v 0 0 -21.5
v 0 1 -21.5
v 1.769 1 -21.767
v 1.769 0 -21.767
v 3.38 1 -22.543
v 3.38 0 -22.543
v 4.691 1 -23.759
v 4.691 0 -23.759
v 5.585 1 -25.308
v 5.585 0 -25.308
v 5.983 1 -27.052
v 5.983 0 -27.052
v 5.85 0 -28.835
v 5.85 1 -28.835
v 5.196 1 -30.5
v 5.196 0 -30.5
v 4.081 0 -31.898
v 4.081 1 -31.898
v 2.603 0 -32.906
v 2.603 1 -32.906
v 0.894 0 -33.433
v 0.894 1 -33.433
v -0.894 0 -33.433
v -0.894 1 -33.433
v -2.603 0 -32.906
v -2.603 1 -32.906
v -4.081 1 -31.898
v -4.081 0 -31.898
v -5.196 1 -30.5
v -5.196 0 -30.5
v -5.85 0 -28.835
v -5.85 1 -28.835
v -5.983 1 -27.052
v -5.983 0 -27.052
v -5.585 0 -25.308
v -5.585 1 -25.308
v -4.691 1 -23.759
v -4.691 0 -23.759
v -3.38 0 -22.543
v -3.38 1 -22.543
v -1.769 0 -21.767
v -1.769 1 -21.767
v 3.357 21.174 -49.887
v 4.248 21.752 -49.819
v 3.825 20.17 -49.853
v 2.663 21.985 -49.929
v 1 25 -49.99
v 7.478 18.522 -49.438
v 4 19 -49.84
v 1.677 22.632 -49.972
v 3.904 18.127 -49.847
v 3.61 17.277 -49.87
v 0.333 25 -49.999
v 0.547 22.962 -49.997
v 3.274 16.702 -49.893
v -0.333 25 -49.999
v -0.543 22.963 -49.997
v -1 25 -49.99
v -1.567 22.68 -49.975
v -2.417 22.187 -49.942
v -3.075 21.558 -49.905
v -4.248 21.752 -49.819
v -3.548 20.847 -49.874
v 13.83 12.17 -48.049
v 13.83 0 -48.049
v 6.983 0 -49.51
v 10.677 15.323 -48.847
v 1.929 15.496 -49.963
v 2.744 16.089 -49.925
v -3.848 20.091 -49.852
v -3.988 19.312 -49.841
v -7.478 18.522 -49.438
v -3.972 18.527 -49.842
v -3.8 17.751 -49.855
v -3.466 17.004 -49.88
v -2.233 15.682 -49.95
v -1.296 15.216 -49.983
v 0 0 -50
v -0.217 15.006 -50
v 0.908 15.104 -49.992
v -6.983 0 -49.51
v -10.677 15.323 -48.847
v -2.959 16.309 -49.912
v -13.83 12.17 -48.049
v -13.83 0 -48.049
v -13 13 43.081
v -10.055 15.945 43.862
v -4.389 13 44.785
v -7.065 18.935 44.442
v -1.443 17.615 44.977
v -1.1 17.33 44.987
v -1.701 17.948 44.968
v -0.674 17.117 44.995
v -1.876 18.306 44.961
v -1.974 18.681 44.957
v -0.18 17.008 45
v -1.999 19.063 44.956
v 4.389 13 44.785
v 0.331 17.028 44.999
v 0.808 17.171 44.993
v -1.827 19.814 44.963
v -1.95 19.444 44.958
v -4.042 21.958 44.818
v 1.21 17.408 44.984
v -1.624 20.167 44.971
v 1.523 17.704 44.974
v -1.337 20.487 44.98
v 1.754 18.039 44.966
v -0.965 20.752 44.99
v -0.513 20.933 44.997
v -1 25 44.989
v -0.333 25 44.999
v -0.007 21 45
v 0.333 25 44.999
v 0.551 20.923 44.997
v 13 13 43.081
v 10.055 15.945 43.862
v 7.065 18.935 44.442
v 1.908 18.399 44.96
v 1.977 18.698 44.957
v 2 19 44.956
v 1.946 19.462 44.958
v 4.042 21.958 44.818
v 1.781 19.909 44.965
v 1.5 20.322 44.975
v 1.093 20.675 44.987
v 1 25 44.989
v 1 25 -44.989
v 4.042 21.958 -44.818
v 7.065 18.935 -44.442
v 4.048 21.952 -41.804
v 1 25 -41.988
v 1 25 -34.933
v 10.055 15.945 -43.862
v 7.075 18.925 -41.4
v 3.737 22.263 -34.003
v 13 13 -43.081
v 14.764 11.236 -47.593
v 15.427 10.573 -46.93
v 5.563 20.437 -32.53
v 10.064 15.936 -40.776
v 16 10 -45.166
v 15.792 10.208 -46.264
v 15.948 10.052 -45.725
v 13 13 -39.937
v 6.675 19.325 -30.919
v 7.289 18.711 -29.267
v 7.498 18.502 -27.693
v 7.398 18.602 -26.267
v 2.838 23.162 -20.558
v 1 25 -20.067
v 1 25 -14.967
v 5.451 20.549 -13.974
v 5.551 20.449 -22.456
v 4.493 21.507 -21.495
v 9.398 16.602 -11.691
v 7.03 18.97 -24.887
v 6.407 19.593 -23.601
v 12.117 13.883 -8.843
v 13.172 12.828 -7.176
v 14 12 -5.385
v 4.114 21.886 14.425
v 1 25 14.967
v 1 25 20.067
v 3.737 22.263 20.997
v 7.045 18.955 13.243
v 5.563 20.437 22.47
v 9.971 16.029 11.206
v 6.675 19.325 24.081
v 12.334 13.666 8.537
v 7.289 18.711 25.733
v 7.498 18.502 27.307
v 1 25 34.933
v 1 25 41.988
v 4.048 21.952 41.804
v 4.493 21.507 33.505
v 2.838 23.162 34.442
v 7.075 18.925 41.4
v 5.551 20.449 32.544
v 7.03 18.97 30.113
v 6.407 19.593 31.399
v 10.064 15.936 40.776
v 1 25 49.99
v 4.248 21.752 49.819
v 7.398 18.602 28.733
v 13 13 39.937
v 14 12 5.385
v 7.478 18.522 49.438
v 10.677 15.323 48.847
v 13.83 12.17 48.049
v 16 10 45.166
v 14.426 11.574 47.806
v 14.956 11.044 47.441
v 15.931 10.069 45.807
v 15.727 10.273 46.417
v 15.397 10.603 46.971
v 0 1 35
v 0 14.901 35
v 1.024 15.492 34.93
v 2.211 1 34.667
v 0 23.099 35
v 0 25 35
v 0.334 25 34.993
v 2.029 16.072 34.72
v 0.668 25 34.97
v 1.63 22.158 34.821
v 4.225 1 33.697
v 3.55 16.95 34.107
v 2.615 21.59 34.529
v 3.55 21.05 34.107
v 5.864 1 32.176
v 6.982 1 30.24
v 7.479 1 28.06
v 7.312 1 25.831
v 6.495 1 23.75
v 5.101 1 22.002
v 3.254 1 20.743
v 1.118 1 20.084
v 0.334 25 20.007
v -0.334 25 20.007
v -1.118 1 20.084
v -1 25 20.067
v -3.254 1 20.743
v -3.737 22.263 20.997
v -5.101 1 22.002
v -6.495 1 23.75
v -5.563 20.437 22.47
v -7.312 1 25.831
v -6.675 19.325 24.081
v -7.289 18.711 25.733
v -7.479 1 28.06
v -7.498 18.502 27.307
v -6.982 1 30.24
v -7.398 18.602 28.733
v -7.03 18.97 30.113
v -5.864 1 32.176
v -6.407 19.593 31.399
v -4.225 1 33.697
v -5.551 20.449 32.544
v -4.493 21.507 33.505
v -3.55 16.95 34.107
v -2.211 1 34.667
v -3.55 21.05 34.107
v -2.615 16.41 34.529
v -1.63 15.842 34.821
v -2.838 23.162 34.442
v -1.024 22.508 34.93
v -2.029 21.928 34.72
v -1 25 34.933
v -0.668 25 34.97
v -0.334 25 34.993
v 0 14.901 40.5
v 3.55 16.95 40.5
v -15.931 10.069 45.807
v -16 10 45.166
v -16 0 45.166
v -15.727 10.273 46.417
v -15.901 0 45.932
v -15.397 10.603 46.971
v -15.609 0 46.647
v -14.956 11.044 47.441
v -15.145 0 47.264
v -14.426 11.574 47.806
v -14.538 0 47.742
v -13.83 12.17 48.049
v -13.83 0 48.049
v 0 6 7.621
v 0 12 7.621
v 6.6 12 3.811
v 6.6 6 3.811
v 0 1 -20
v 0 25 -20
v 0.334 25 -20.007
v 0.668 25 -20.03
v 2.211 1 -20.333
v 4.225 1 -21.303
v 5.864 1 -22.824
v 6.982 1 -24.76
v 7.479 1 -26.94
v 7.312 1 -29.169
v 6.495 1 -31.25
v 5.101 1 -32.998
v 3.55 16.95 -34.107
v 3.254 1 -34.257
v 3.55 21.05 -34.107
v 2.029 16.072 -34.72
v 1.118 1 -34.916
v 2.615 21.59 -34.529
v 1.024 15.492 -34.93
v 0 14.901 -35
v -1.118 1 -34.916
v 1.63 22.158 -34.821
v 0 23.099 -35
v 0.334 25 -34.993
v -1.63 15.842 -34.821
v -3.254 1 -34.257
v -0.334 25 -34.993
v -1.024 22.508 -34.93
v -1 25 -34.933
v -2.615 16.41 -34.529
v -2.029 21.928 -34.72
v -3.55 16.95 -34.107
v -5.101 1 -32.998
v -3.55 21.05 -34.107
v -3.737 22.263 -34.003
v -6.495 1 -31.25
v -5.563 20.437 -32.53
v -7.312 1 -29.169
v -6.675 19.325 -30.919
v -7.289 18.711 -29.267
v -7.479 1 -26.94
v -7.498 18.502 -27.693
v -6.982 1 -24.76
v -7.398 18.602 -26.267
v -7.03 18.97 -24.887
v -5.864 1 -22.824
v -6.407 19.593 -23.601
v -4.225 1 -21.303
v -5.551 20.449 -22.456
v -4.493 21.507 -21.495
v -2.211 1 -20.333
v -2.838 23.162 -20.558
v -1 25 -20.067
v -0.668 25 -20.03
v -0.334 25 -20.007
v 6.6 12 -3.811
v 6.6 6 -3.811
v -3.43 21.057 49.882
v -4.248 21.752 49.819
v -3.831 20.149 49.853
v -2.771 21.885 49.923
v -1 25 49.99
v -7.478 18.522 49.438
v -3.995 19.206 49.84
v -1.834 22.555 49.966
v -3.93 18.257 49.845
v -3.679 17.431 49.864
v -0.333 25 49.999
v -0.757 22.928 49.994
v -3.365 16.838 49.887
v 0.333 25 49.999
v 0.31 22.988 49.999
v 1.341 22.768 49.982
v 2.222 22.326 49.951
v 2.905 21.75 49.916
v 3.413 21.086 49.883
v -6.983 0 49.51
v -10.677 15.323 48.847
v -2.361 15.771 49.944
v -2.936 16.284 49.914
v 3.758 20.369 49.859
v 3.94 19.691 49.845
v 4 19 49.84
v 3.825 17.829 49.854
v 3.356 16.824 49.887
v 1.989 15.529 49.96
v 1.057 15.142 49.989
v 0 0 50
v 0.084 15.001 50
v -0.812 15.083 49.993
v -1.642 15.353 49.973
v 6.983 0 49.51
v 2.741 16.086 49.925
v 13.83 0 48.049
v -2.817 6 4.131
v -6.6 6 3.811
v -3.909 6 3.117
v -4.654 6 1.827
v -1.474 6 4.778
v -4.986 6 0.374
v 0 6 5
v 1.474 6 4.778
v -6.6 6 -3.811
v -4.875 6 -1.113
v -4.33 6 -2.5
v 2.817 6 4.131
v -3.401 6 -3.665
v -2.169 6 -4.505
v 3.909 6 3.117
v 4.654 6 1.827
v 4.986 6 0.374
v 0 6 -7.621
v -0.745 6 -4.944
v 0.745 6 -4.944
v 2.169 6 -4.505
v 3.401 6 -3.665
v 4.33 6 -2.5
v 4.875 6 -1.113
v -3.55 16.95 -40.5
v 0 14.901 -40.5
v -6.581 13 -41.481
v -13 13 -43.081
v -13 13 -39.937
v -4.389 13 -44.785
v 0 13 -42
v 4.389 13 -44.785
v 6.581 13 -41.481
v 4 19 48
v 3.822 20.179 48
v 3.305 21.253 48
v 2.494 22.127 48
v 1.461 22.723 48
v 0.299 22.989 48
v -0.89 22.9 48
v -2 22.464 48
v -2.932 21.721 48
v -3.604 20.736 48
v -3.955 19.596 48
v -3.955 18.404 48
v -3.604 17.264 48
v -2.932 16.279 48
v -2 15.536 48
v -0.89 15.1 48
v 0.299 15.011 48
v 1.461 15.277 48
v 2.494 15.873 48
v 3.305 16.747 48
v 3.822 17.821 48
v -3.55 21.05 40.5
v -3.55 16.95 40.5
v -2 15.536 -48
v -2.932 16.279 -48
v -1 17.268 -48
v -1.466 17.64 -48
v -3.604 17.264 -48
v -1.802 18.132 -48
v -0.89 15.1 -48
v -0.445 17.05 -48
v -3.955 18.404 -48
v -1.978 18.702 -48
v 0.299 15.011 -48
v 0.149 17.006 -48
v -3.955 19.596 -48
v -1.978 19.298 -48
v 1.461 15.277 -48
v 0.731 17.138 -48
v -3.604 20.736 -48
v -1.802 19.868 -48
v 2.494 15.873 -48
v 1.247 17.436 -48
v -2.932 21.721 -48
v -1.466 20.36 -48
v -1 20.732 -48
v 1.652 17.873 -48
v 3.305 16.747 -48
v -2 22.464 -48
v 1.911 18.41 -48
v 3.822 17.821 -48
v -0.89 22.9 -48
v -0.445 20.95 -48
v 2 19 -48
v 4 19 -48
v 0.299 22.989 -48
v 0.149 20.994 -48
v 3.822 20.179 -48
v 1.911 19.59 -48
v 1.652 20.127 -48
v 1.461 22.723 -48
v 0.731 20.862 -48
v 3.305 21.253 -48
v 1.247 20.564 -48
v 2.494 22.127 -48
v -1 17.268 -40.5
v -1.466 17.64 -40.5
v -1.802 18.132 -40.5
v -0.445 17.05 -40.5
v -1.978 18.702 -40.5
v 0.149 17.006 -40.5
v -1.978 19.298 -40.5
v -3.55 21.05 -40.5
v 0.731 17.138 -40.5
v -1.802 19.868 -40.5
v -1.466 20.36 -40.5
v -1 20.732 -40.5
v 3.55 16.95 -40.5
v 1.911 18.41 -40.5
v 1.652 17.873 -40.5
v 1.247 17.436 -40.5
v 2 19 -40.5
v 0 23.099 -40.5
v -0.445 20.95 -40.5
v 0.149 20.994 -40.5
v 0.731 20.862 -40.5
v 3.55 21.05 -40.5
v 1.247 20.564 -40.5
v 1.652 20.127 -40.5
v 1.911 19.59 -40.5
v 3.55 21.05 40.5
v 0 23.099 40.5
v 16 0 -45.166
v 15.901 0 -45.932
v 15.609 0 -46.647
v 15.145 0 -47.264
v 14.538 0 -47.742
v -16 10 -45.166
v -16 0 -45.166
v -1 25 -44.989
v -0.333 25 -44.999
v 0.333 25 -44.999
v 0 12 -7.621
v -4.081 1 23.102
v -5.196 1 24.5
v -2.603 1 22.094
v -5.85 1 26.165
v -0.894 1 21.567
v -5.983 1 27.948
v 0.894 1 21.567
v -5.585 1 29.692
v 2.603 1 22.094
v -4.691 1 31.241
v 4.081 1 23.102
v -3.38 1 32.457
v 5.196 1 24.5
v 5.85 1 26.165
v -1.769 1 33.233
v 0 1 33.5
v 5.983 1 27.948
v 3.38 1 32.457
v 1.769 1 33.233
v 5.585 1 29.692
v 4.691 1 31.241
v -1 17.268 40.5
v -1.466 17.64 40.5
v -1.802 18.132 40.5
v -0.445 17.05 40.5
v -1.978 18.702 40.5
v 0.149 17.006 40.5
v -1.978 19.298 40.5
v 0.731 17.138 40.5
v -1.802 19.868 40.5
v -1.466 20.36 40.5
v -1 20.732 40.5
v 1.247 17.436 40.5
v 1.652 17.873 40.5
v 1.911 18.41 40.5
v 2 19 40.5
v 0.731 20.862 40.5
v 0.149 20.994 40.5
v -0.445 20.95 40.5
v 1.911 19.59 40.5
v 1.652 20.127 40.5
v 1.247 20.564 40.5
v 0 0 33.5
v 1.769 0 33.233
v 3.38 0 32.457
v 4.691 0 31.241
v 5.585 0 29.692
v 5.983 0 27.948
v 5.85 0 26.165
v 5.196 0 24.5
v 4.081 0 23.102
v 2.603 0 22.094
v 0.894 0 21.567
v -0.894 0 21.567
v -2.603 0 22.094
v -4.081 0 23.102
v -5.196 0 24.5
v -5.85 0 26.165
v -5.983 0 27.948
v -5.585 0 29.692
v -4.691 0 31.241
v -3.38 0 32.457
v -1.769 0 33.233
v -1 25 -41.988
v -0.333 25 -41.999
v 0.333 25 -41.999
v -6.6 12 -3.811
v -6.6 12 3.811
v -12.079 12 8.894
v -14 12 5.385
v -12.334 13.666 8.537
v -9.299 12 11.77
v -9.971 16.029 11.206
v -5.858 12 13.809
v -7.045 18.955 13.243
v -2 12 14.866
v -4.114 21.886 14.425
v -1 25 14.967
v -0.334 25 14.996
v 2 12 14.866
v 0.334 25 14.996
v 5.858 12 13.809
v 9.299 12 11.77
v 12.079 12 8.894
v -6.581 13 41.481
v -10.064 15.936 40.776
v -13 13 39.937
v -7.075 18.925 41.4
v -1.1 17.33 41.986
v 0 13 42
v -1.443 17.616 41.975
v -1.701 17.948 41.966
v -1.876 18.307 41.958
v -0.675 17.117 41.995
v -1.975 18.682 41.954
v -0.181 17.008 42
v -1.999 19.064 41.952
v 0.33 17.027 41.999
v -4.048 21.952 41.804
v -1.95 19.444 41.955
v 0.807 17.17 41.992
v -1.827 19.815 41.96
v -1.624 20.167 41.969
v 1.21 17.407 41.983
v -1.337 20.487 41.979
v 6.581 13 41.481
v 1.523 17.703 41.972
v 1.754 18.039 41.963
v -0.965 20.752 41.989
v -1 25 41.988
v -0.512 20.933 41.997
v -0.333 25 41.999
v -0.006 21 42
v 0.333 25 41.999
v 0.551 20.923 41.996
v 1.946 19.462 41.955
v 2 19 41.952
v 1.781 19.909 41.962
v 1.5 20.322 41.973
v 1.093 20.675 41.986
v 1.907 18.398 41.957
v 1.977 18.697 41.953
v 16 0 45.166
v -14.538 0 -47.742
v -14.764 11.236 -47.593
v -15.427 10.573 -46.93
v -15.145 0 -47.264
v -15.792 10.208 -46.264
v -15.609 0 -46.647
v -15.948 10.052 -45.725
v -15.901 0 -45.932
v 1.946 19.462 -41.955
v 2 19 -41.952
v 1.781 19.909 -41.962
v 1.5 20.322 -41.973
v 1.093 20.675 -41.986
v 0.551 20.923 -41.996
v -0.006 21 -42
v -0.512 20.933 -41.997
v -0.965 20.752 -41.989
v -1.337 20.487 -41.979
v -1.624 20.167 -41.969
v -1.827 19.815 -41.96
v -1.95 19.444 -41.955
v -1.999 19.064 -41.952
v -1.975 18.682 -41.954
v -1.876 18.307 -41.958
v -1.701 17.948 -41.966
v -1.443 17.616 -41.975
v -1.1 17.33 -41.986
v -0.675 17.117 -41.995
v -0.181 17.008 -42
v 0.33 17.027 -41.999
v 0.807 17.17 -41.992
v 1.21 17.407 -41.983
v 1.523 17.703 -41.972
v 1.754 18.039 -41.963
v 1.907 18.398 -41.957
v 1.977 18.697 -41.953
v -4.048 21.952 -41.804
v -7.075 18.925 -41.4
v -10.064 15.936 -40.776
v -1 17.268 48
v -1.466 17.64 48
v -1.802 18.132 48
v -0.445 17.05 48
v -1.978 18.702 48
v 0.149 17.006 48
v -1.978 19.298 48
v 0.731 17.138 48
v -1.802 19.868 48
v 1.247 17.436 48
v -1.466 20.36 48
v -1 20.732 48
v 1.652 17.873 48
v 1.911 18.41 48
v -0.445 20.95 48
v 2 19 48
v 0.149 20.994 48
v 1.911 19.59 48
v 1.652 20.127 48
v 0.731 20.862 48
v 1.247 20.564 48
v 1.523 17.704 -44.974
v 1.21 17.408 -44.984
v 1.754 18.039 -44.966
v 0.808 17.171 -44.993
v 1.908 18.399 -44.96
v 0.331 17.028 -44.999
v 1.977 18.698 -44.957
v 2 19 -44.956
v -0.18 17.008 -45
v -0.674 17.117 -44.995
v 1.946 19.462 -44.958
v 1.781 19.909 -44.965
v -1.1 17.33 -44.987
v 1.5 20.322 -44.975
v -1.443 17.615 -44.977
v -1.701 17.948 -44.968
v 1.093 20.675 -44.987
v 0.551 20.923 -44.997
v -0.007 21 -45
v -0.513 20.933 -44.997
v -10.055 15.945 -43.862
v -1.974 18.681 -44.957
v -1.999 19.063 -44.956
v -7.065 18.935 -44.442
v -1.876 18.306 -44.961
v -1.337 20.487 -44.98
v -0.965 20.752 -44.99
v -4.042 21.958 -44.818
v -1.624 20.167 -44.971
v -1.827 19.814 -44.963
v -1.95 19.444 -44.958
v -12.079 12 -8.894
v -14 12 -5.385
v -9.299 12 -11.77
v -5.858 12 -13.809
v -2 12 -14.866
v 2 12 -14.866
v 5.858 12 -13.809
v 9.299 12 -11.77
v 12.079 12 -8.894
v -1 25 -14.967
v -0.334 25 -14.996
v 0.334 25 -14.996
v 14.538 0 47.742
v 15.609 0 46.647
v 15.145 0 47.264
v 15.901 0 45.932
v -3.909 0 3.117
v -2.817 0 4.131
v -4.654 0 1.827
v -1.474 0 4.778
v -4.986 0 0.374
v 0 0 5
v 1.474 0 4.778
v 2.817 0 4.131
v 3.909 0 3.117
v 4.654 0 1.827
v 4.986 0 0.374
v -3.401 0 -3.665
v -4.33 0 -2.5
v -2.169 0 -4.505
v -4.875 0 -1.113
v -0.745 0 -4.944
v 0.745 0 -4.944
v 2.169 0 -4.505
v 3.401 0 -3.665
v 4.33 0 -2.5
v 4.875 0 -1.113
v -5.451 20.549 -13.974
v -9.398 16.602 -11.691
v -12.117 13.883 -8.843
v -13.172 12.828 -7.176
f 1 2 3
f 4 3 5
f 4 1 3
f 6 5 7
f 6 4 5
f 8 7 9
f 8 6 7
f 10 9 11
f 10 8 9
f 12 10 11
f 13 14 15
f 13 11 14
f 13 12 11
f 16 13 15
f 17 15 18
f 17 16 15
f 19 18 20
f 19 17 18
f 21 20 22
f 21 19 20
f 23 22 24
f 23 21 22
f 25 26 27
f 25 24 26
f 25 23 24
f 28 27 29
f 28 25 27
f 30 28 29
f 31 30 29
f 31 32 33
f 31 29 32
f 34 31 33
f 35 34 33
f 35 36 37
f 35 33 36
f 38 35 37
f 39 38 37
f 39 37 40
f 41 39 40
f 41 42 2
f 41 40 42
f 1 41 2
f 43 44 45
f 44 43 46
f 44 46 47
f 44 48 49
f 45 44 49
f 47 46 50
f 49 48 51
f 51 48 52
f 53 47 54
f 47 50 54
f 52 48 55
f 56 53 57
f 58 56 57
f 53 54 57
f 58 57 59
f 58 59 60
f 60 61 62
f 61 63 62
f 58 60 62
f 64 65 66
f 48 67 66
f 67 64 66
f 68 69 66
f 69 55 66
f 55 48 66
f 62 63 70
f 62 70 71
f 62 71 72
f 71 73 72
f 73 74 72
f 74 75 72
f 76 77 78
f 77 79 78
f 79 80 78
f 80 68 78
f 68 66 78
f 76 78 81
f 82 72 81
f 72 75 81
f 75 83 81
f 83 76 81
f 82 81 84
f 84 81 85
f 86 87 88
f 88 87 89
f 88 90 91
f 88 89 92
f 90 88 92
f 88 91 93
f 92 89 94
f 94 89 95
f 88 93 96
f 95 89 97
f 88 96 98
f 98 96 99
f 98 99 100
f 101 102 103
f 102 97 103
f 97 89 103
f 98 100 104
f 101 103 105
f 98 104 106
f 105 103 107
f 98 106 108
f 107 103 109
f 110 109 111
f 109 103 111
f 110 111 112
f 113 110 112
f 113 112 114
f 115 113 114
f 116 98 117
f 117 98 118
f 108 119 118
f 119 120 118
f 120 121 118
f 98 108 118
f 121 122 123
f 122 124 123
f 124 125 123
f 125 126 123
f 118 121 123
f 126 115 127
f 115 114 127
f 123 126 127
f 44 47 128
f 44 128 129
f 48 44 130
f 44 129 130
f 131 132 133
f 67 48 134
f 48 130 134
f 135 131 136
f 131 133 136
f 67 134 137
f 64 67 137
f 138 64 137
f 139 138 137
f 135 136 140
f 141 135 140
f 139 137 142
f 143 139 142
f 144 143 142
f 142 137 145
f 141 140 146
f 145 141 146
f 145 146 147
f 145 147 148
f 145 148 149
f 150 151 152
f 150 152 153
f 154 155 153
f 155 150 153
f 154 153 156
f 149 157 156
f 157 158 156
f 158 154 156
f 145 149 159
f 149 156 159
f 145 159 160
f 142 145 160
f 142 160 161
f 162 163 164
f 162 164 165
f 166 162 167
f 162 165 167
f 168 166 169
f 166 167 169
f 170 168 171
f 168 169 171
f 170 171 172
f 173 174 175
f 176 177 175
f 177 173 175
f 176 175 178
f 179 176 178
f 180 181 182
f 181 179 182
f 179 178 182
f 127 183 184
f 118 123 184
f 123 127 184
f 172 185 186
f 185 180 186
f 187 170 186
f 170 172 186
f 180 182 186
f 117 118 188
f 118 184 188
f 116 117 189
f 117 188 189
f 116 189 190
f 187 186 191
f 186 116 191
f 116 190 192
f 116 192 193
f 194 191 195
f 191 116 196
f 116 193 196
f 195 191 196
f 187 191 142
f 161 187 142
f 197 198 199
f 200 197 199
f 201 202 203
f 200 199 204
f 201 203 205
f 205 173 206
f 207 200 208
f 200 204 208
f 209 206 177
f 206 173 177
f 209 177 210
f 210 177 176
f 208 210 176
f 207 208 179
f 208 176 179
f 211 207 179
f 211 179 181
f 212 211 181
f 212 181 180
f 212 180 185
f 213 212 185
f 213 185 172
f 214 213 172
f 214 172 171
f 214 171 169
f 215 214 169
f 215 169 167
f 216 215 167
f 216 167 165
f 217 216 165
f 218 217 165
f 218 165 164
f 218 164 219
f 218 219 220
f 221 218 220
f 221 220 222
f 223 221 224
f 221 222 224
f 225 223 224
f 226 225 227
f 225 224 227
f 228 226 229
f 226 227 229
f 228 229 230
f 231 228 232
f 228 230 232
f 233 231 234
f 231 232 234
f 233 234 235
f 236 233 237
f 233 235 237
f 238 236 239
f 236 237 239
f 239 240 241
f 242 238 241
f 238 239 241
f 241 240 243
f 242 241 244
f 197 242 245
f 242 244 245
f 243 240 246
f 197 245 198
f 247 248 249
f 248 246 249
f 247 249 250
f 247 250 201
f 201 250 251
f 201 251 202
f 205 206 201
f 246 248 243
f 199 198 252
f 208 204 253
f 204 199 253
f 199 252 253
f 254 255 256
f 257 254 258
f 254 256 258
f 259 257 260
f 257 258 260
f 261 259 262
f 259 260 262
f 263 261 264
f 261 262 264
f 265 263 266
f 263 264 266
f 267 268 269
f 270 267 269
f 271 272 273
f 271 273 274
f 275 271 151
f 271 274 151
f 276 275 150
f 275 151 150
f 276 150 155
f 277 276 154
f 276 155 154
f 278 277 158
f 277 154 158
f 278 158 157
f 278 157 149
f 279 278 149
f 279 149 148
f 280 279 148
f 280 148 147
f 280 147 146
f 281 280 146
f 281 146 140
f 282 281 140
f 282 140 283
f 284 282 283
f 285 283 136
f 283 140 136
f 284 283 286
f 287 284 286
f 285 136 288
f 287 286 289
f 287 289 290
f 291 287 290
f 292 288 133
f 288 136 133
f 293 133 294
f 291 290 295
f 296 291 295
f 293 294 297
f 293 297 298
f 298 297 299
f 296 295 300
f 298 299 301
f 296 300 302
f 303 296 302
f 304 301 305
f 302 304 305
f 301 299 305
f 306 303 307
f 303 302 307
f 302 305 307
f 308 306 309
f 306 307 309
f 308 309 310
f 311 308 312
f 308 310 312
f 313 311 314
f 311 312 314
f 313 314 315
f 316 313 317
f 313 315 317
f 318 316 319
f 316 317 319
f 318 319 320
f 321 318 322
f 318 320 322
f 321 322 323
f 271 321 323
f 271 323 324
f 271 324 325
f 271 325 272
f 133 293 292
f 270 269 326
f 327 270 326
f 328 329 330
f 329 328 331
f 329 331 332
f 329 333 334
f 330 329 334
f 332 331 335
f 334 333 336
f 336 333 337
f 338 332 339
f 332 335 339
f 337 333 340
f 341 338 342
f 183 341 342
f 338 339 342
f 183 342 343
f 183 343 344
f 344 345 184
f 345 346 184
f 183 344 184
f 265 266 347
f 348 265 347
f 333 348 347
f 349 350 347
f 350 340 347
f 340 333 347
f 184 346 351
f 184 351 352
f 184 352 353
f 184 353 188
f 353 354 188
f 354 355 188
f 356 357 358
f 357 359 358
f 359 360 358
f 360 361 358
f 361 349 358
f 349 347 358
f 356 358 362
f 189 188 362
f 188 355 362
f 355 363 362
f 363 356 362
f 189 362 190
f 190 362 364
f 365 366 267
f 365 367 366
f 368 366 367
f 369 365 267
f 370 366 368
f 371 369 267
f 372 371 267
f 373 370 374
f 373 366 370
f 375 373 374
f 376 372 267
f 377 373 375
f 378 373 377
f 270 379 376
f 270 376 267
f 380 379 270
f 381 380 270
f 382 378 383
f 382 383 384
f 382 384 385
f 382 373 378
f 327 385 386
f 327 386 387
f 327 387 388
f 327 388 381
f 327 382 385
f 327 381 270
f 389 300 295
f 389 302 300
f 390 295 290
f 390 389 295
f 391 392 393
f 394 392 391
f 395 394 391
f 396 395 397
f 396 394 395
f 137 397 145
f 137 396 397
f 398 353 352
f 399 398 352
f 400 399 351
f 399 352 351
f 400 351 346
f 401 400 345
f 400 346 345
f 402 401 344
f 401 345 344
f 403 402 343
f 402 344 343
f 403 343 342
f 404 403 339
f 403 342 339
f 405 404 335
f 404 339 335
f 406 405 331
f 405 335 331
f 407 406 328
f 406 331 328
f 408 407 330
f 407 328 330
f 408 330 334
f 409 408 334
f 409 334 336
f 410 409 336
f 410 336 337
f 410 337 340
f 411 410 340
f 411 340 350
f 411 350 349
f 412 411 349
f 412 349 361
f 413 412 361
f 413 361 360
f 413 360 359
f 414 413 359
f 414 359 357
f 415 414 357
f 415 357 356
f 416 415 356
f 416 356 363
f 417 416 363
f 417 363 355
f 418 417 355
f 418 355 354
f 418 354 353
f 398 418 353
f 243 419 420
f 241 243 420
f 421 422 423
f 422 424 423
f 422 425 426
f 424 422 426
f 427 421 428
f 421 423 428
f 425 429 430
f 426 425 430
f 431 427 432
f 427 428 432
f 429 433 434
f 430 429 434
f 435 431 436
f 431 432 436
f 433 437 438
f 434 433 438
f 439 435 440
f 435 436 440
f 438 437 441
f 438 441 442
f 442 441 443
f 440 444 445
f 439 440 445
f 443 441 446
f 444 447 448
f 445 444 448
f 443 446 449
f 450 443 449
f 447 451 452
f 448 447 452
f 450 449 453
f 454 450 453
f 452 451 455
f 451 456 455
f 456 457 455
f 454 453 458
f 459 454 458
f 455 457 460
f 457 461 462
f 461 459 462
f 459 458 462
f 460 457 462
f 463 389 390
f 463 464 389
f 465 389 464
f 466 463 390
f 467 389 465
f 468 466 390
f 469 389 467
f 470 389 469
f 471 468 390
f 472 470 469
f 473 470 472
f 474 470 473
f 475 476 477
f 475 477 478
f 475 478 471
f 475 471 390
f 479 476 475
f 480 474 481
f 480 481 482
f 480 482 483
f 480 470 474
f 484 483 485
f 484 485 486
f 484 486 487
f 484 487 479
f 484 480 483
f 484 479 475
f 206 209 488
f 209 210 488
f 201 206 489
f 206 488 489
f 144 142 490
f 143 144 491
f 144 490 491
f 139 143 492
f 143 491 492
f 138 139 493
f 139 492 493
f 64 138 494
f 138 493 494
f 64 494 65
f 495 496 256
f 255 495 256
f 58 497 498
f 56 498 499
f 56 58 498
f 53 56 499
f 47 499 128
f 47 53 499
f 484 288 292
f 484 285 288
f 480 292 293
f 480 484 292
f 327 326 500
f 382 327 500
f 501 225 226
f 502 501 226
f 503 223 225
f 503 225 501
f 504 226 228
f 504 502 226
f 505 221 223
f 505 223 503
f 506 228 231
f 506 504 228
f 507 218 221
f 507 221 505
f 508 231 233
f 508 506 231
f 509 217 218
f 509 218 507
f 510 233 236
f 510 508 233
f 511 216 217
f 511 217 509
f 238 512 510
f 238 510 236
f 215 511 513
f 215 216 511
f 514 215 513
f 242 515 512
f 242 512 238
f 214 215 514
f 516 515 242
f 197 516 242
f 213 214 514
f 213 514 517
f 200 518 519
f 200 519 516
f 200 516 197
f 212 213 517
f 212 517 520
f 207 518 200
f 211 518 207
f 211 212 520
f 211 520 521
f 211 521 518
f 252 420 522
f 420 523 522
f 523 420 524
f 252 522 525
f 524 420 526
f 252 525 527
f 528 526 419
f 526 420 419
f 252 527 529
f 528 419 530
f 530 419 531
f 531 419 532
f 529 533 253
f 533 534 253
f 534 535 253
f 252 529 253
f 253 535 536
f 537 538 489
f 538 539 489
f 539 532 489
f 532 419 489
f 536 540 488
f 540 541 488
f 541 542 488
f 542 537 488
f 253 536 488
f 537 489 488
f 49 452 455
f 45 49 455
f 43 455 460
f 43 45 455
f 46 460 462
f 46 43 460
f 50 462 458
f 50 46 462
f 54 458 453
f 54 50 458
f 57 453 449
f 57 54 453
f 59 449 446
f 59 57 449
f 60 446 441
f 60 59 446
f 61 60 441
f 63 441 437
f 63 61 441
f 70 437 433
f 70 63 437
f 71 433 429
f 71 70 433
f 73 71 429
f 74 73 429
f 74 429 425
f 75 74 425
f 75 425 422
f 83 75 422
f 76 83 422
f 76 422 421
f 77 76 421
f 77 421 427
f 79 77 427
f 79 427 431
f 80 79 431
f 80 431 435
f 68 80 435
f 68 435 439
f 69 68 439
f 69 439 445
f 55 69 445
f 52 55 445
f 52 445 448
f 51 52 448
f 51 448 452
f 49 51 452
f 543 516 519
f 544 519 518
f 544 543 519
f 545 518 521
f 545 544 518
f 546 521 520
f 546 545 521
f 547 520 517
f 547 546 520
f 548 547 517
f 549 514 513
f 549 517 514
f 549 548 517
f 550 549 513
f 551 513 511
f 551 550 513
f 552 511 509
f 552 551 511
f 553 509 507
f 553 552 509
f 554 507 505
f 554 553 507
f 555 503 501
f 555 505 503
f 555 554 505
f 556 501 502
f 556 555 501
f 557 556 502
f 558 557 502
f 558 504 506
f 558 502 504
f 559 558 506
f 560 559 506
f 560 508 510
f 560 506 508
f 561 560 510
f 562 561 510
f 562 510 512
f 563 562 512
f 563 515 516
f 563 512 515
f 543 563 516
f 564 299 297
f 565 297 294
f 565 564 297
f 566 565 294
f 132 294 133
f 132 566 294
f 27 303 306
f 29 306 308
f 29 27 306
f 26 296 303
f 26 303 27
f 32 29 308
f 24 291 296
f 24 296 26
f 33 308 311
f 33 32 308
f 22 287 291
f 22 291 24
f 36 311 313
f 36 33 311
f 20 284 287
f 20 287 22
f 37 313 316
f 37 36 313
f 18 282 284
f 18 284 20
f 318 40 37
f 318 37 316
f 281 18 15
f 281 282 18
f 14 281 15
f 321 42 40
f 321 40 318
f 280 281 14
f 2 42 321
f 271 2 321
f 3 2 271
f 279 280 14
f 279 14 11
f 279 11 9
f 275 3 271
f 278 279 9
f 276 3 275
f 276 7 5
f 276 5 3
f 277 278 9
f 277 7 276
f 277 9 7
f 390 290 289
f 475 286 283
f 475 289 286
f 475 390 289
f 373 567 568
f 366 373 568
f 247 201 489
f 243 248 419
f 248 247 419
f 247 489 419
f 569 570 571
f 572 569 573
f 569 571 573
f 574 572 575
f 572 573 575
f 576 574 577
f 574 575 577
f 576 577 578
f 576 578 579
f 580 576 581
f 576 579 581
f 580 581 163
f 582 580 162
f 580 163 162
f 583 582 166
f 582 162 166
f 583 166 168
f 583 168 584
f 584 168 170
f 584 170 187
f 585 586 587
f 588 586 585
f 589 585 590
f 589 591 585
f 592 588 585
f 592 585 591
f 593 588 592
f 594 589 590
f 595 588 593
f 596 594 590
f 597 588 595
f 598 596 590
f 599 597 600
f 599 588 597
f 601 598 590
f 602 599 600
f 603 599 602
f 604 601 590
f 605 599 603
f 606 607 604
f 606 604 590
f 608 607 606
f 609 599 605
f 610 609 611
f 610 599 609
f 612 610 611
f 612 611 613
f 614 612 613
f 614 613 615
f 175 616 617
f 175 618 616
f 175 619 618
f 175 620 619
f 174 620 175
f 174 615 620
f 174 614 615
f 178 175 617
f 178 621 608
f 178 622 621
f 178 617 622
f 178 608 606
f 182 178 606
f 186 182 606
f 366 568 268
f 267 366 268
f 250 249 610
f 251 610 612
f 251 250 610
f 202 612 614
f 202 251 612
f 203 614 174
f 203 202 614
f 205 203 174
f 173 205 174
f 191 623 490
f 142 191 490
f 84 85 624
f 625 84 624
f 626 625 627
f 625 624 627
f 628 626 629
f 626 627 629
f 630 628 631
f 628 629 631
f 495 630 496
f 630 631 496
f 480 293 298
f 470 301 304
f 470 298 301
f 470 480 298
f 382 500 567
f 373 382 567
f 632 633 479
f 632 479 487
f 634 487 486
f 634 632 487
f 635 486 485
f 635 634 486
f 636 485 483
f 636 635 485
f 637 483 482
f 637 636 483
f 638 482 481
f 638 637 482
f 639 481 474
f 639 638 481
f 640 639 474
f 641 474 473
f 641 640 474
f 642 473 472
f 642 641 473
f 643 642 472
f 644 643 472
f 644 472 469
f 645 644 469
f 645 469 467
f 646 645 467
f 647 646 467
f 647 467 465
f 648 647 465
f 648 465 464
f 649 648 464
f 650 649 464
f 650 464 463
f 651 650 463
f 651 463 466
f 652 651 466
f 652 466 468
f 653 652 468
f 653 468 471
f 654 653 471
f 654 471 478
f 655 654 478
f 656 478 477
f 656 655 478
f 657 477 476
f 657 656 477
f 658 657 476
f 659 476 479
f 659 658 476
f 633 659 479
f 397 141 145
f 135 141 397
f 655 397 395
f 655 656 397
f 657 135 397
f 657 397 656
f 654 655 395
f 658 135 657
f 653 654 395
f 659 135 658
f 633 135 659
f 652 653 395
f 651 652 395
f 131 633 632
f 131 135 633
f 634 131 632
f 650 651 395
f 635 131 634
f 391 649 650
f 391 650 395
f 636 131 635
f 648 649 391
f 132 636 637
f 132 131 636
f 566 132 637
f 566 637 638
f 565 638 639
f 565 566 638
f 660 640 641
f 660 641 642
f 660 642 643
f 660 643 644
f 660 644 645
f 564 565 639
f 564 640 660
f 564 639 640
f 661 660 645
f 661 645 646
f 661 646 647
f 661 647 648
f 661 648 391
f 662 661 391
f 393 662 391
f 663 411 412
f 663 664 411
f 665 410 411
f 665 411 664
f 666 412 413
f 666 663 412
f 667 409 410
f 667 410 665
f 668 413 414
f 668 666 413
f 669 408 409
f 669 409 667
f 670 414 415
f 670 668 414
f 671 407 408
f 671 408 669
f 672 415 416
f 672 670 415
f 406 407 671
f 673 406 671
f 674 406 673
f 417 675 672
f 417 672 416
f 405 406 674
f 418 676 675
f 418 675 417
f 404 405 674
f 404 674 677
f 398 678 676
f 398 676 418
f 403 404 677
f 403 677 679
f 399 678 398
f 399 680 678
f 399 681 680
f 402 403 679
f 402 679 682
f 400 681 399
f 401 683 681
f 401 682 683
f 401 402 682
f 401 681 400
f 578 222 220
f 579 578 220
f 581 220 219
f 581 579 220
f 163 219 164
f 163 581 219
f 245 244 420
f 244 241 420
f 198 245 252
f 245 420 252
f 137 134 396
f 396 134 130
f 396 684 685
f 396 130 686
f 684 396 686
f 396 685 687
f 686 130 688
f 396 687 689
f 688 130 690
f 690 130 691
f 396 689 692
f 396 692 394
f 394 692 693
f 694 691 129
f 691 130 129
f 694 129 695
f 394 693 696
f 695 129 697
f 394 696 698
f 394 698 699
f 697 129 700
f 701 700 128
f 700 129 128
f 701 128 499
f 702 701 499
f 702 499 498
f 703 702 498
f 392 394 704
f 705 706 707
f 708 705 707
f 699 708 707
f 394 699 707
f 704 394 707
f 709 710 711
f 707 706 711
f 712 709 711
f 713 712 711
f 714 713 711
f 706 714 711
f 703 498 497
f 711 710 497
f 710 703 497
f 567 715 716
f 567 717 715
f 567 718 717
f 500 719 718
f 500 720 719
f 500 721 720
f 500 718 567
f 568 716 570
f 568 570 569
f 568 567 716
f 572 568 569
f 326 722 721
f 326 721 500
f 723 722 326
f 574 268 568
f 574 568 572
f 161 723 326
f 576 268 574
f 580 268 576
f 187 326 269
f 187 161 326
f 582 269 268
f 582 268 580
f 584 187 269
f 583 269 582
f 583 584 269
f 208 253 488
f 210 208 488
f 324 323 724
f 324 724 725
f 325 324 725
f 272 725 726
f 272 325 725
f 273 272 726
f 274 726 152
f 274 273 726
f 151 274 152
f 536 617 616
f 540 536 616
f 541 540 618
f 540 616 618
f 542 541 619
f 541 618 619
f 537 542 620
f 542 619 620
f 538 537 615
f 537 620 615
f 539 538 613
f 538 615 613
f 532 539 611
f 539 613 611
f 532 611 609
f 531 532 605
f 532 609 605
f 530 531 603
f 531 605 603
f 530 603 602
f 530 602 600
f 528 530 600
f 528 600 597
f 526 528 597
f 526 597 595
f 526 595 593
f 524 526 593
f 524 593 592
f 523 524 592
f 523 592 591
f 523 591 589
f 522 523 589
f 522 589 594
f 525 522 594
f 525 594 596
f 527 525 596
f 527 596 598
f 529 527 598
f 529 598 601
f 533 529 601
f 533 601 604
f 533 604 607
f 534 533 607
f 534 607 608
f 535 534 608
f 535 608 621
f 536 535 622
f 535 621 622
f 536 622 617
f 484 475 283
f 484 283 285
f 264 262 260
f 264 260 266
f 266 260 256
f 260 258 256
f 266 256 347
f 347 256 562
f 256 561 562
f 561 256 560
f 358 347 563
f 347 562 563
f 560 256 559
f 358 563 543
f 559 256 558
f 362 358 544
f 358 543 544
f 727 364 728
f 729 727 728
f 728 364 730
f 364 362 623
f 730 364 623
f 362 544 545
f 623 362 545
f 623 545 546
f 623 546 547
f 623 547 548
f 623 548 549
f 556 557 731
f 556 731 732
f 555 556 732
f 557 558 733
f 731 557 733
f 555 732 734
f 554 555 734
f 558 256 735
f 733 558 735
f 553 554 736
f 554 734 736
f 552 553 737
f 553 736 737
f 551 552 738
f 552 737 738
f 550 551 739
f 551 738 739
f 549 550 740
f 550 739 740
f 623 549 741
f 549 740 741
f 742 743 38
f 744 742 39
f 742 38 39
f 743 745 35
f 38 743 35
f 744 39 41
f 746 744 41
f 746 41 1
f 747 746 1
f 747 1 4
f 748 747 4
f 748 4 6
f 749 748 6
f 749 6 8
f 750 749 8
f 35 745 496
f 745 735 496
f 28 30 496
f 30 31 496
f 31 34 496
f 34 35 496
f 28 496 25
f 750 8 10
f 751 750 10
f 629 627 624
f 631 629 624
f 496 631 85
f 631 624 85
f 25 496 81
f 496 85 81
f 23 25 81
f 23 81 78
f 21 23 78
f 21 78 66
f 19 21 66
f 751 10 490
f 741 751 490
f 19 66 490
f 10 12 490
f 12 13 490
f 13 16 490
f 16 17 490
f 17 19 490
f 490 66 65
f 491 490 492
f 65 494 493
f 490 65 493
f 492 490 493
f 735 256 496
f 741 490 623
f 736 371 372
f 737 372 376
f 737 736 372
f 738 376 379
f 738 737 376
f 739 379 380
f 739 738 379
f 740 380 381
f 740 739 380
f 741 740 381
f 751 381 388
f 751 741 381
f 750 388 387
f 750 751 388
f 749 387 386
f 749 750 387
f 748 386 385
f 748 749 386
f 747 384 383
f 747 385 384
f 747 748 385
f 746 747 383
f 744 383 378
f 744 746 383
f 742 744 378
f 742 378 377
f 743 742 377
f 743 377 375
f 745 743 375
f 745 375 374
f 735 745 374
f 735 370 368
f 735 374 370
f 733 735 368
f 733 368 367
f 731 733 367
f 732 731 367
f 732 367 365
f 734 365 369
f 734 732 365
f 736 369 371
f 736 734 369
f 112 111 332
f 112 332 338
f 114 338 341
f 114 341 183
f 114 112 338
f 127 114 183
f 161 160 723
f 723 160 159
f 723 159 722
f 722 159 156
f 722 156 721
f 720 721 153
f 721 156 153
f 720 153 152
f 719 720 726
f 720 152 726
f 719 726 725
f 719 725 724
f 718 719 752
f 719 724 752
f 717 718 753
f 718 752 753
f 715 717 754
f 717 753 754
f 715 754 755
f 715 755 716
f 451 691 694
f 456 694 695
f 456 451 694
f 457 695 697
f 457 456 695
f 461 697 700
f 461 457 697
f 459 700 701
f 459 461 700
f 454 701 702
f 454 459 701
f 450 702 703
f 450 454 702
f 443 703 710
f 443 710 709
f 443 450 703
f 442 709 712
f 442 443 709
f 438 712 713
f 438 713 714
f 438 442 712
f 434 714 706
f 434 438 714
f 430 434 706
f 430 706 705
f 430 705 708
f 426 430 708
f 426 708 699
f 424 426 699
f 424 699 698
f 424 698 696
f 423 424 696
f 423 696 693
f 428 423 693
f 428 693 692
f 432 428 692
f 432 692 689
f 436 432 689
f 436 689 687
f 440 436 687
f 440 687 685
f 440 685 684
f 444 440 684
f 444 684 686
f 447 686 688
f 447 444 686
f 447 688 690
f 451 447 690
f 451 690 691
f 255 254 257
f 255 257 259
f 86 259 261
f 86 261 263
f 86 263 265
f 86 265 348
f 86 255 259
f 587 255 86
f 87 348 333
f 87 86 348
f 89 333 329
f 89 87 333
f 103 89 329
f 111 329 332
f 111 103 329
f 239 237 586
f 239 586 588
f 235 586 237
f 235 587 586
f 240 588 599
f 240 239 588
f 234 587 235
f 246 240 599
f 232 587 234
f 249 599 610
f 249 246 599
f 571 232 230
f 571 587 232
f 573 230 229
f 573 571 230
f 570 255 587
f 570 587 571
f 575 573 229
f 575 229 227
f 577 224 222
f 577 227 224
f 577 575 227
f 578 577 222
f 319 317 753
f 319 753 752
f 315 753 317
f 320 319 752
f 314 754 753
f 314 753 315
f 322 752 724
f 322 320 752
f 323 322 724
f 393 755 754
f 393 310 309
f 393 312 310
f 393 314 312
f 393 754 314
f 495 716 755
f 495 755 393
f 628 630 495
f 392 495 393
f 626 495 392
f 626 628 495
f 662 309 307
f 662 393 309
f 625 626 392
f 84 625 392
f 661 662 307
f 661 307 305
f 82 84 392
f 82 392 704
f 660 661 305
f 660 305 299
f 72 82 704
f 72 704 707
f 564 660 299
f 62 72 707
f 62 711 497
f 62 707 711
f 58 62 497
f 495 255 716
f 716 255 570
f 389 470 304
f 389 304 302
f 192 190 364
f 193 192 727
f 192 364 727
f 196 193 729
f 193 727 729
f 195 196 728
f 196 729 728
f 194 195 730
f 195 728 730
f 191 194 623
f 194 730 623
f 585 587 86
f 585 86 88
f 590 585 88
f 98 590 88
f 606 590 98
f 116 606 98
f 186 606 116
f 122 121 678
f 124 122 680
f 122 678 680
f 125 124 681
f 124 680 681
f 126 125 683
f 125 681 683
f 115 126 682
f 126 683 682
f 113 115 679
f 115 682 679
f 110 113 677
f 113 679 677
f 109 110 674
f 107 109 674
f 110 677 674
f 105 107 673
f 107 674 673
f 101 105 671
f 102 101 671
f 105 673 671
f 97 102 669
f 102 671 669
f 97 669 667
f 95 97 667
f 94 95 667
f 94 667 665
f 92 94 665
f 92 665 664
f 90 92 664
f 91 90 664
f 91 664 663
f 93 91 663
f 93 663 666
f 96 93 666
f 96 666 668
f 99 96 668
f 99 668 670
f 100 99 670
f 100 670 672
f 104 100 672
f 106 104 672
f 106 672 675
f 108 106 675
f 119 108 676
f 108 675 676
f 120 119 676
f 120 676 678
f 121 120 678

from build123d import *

# Parameters (mm, degrees)
SKETCH1_R               = 5
SKETCH1_R_2             = 6
BOSS_EXTRUDE1_DEPTH     = 25
SKETCH2_R               = 7.5
CUT_EXTRUDE1_DEPTH      = 24
SKETCH3_R               = 15
CUT_EXTRUDE2_DEPTH      = 13
CUT_EXTRUDE3_DEPTH      = 6
SKETCH5_R               = 45
SKETCH5_R_2             = 42
CUT_EXTRUDE_THIN1_DEPTH = 12
CHAMFER1_SIZE           = 15
SKETCH6_R               = 4
CUT_EXTRUDE4_DEPTH      = 2
SKETCH7_R               = 2
CUT_EXTRUDE5_DEPTH      = 20
CUT_EXTRUDE6_REACH      = 111.896
CUT_EXTRUDE6_END_RADIUS = 7.5
CUT_EXTRUDE6_START      = -7.5


with BuildPart() as part:
    # Sketch1 → Boss-Extrude1 (new body)
    with BuildSketch(Plane(origin=(0, 0, 0), x_dir=(1, 0, 0), z_dir=(0, 1, 0))):
        with BuildLine():
            Line((-16, 45.166359163), (-16, -45.166359163))
            ThreePointArc((-16, -45.166359163), (-15.396806386, -46.970609464), (-13.829787234, -48.049318258))
            ThreePointArc((-13.829787234, -48.049318258), (0, -50), (13.829787234, -48.049318258))
            ThreePointArc((13.829787234, -48.049318258), (15.396806386, -46.970609464), (16, -45.166359163))
            Line((16, -45.166359163), (16, 45.166359163))
            ThreePointArc((16, 45.166359163), (15.396806386, 46.970609464), (13.829787234, 48.049318258))
            ThreePointArc((13.829787234, 48.049318258), (0, 50), (-13.829787234, 48.049318258))
            ThreePointArc((-13.829787234, 48.049318258), (-15.396806386, 46.970609464), (-16, 45.166359163))
        make_face()
        with Locations(Location((0, 0, 0), (0, 0, 270))):
            Circle(SKETCH1_R, mode=Mode.SUBTRACT)
        with Locations(Location((0, -27.5, 0), (0, 0, 270))):
            Circle(SKETCH1_R_2, mode=Mode.SUBTRACT)
        with Locations(Location((0, 27.5, 0), (0, 0, 270))):
            Circle(SKETCH1_R_2, mode=Mode.SUBTRACT)
    extrude(amount=BOSS_EXTRUDE1_DEPTH)

    # Sketch2 → Cut-Extrude1 (cut)
    with BuildSketch(Plane(origin=(0, 25, 0), x_dir=(1, 0, 0), z_dir=(0, 1, 0))):
        with Locations(Location((0, 27.5, 0), (0, 0, 270))):
            Circle(SKETCH2_R)
        with Locations(Location((0, -27.5, 0), (0, 0, 270))):
            Circle(SKETCH2_R)
    extrude(amount=-CUT_EXTRUDE1_DEPTH, mode=Mode.SUBTRACT)

    # Sketch3 → Cut-Extrude2 (cut)
    with BuildSketch(Plane(origin=(0, 25, 0), x_dir=(1, 0, 0), z_dir=(0, 1, 0))):
        with Locations(Location((0, 0, 0), (0, 0, 270))):
            Circle(SKETCH3_R)
    extrude(amount=-CUT_EXTRUDE2_DEPTH, mode=Mode.SUBTRACT)

    # Sketch4 → Cut-Extrude3 (cut)
    with BuildSketch(Plane(origin=(0, 12, 0), x_dir=(1, 0, 0), z_dir=(0, 1, 0))):
        Polygon((0, 7.621023553), (-6.6, 3.810511777), (-6.6, -3.810511777), (0, -7.621023553), (6.6, -3.810511777), (6.6, 3.810511777), align=None)
    extrude(amount=-CUT_EXTRUDE3_DEPTH, mode=Mode.SUBTRACT)

    # Sketch5 → Cut-Extrude-Thin1 (cut)
    with BuildSketch(Plane(origin=(0, 25, 0), x_dir=(1, 0, 0), z_dir=(0, 1, 0))):
        Circle(SKETCH5_R)
        Circle(SKETCH5_R_2, mode=Mode.SUBTRACT)
    extrude(amount=-CUT_EXTRUDE_THIN1_DEPTH, mode=Mode.SUBTRACT)

    # Chamfer1
    # the kernel refuses this chamfer: 15 mm, written as the material it takes off along each edge
    with BuildSketch(Plane(origin=(-16, 25, -77.408220497), x_dir=(-0.02749587661058632, -0.9996219169112968, 0), z_dir=(0, 0, 1))) as chamfer1_piece_1:
        Polygon((CHAMFER1_SIZE * 0.999621916911, CHAMFER1_SIZE * 0.0274958766106), (-CHAMFER1_SIZE * 0.0274958766106, CHAMFER1_SIZE * 0.999621916911), (0, 0), align=None)
    extrude(amount=154.816440995, mode=Mode.SUBTRACT)
    with BuildSketch(Plane(origin=(16, 25, 77.408220497), x_dir=(-0.9996219169112968, 0.02749587661058632, 0), z_dir=(0, 0, -1))) as chamfer1_piece_2:
        Polygon((CHAMFER1_SIZE * 0.999621916911, -CHAMFER1_SIZE * 0.0274958766106), (-CHAMFER1_SIZE * 0.0274958766106, -CHAMFER1_SIZE * 0.999621916911), (0, 0), align=None)
    extrude(amount=154.816440995, mode=Mode.SUBTRACT)

    # Sketch6 → Cut-Extrude4 (cut)
    with BuildSketch(Plane.XY.offset(50)):
        with Locations((0, 19)):
            Circle(SKETCH6_R)
    cut_extrude4 = extrude(amount=-CUT_EXTRUDE4_DEPTH, mode=Mode.SUBTRACT)

    # Sketch7 → Cut-Extrude5 (cut)
    with BuildSketch(Plane.XY.offset(48)):
        with Locations((0, 19)):
            Circle(SKETCH7_R)
    cut_extrude5 = extrude(amount=-CUT_EXTRUDE5_DEPTH, mode=Mode.SUBTRACT)

    # Cut-Extrude6: up to this cylinder (the profile starts outside it)
    cut_extrude6_end = Plane(origin=(0, 19, 27.5), z_dir=(0, 1, 0)) * Cylinder(CUT_EXTRUDE6_END_RADIUS, 239.792, mode=Mode.PRIVATE)
    # Sketch8 → Cut-Extrude6 (cut, up to the surface)
    with BuildSketch(Plane.XY.offset(48).offset(CUT_EXTRUDE6_START), mode=Mode.PRIVATE) as cut_extrude6_sk1:
        Polygon((0, 14.900813089), (3.55, 16.950406544), (3.55, 21.049593456), (0, 23.099186911), (-3.55, 21.049593456), (-3.55, 16.950406544), align=None)
    cut_extrude6_tool1 = extrude(cut_extrude6_sk1.sketch, amount=-CUT_EXTRUDE6_REACH, mode=Mode.PRIVATE) - cut_extrude6_end
    cut_extrude6 = cut_extrude6_tool1.solids().sort_by_distance((0, 19, 40.5))[0]
    add(cut_extrude6, mode=Mode.SUBTRACT)

    # Mirror1: Cut-Extrude4, Cut-Extrude5, Cut-Extrude6 across plane
    add(cut_extrude4.mirror(Plane.XY), mode=Mode.SUBTRACT)
    add(cut_extrude5.mirror(Plane.XY), mode=Mode.SUBTRACT)
    add(cut_extrude6.mirror(Plane.XY), mode=Mode.SUBTRACT)


solid = part.part
